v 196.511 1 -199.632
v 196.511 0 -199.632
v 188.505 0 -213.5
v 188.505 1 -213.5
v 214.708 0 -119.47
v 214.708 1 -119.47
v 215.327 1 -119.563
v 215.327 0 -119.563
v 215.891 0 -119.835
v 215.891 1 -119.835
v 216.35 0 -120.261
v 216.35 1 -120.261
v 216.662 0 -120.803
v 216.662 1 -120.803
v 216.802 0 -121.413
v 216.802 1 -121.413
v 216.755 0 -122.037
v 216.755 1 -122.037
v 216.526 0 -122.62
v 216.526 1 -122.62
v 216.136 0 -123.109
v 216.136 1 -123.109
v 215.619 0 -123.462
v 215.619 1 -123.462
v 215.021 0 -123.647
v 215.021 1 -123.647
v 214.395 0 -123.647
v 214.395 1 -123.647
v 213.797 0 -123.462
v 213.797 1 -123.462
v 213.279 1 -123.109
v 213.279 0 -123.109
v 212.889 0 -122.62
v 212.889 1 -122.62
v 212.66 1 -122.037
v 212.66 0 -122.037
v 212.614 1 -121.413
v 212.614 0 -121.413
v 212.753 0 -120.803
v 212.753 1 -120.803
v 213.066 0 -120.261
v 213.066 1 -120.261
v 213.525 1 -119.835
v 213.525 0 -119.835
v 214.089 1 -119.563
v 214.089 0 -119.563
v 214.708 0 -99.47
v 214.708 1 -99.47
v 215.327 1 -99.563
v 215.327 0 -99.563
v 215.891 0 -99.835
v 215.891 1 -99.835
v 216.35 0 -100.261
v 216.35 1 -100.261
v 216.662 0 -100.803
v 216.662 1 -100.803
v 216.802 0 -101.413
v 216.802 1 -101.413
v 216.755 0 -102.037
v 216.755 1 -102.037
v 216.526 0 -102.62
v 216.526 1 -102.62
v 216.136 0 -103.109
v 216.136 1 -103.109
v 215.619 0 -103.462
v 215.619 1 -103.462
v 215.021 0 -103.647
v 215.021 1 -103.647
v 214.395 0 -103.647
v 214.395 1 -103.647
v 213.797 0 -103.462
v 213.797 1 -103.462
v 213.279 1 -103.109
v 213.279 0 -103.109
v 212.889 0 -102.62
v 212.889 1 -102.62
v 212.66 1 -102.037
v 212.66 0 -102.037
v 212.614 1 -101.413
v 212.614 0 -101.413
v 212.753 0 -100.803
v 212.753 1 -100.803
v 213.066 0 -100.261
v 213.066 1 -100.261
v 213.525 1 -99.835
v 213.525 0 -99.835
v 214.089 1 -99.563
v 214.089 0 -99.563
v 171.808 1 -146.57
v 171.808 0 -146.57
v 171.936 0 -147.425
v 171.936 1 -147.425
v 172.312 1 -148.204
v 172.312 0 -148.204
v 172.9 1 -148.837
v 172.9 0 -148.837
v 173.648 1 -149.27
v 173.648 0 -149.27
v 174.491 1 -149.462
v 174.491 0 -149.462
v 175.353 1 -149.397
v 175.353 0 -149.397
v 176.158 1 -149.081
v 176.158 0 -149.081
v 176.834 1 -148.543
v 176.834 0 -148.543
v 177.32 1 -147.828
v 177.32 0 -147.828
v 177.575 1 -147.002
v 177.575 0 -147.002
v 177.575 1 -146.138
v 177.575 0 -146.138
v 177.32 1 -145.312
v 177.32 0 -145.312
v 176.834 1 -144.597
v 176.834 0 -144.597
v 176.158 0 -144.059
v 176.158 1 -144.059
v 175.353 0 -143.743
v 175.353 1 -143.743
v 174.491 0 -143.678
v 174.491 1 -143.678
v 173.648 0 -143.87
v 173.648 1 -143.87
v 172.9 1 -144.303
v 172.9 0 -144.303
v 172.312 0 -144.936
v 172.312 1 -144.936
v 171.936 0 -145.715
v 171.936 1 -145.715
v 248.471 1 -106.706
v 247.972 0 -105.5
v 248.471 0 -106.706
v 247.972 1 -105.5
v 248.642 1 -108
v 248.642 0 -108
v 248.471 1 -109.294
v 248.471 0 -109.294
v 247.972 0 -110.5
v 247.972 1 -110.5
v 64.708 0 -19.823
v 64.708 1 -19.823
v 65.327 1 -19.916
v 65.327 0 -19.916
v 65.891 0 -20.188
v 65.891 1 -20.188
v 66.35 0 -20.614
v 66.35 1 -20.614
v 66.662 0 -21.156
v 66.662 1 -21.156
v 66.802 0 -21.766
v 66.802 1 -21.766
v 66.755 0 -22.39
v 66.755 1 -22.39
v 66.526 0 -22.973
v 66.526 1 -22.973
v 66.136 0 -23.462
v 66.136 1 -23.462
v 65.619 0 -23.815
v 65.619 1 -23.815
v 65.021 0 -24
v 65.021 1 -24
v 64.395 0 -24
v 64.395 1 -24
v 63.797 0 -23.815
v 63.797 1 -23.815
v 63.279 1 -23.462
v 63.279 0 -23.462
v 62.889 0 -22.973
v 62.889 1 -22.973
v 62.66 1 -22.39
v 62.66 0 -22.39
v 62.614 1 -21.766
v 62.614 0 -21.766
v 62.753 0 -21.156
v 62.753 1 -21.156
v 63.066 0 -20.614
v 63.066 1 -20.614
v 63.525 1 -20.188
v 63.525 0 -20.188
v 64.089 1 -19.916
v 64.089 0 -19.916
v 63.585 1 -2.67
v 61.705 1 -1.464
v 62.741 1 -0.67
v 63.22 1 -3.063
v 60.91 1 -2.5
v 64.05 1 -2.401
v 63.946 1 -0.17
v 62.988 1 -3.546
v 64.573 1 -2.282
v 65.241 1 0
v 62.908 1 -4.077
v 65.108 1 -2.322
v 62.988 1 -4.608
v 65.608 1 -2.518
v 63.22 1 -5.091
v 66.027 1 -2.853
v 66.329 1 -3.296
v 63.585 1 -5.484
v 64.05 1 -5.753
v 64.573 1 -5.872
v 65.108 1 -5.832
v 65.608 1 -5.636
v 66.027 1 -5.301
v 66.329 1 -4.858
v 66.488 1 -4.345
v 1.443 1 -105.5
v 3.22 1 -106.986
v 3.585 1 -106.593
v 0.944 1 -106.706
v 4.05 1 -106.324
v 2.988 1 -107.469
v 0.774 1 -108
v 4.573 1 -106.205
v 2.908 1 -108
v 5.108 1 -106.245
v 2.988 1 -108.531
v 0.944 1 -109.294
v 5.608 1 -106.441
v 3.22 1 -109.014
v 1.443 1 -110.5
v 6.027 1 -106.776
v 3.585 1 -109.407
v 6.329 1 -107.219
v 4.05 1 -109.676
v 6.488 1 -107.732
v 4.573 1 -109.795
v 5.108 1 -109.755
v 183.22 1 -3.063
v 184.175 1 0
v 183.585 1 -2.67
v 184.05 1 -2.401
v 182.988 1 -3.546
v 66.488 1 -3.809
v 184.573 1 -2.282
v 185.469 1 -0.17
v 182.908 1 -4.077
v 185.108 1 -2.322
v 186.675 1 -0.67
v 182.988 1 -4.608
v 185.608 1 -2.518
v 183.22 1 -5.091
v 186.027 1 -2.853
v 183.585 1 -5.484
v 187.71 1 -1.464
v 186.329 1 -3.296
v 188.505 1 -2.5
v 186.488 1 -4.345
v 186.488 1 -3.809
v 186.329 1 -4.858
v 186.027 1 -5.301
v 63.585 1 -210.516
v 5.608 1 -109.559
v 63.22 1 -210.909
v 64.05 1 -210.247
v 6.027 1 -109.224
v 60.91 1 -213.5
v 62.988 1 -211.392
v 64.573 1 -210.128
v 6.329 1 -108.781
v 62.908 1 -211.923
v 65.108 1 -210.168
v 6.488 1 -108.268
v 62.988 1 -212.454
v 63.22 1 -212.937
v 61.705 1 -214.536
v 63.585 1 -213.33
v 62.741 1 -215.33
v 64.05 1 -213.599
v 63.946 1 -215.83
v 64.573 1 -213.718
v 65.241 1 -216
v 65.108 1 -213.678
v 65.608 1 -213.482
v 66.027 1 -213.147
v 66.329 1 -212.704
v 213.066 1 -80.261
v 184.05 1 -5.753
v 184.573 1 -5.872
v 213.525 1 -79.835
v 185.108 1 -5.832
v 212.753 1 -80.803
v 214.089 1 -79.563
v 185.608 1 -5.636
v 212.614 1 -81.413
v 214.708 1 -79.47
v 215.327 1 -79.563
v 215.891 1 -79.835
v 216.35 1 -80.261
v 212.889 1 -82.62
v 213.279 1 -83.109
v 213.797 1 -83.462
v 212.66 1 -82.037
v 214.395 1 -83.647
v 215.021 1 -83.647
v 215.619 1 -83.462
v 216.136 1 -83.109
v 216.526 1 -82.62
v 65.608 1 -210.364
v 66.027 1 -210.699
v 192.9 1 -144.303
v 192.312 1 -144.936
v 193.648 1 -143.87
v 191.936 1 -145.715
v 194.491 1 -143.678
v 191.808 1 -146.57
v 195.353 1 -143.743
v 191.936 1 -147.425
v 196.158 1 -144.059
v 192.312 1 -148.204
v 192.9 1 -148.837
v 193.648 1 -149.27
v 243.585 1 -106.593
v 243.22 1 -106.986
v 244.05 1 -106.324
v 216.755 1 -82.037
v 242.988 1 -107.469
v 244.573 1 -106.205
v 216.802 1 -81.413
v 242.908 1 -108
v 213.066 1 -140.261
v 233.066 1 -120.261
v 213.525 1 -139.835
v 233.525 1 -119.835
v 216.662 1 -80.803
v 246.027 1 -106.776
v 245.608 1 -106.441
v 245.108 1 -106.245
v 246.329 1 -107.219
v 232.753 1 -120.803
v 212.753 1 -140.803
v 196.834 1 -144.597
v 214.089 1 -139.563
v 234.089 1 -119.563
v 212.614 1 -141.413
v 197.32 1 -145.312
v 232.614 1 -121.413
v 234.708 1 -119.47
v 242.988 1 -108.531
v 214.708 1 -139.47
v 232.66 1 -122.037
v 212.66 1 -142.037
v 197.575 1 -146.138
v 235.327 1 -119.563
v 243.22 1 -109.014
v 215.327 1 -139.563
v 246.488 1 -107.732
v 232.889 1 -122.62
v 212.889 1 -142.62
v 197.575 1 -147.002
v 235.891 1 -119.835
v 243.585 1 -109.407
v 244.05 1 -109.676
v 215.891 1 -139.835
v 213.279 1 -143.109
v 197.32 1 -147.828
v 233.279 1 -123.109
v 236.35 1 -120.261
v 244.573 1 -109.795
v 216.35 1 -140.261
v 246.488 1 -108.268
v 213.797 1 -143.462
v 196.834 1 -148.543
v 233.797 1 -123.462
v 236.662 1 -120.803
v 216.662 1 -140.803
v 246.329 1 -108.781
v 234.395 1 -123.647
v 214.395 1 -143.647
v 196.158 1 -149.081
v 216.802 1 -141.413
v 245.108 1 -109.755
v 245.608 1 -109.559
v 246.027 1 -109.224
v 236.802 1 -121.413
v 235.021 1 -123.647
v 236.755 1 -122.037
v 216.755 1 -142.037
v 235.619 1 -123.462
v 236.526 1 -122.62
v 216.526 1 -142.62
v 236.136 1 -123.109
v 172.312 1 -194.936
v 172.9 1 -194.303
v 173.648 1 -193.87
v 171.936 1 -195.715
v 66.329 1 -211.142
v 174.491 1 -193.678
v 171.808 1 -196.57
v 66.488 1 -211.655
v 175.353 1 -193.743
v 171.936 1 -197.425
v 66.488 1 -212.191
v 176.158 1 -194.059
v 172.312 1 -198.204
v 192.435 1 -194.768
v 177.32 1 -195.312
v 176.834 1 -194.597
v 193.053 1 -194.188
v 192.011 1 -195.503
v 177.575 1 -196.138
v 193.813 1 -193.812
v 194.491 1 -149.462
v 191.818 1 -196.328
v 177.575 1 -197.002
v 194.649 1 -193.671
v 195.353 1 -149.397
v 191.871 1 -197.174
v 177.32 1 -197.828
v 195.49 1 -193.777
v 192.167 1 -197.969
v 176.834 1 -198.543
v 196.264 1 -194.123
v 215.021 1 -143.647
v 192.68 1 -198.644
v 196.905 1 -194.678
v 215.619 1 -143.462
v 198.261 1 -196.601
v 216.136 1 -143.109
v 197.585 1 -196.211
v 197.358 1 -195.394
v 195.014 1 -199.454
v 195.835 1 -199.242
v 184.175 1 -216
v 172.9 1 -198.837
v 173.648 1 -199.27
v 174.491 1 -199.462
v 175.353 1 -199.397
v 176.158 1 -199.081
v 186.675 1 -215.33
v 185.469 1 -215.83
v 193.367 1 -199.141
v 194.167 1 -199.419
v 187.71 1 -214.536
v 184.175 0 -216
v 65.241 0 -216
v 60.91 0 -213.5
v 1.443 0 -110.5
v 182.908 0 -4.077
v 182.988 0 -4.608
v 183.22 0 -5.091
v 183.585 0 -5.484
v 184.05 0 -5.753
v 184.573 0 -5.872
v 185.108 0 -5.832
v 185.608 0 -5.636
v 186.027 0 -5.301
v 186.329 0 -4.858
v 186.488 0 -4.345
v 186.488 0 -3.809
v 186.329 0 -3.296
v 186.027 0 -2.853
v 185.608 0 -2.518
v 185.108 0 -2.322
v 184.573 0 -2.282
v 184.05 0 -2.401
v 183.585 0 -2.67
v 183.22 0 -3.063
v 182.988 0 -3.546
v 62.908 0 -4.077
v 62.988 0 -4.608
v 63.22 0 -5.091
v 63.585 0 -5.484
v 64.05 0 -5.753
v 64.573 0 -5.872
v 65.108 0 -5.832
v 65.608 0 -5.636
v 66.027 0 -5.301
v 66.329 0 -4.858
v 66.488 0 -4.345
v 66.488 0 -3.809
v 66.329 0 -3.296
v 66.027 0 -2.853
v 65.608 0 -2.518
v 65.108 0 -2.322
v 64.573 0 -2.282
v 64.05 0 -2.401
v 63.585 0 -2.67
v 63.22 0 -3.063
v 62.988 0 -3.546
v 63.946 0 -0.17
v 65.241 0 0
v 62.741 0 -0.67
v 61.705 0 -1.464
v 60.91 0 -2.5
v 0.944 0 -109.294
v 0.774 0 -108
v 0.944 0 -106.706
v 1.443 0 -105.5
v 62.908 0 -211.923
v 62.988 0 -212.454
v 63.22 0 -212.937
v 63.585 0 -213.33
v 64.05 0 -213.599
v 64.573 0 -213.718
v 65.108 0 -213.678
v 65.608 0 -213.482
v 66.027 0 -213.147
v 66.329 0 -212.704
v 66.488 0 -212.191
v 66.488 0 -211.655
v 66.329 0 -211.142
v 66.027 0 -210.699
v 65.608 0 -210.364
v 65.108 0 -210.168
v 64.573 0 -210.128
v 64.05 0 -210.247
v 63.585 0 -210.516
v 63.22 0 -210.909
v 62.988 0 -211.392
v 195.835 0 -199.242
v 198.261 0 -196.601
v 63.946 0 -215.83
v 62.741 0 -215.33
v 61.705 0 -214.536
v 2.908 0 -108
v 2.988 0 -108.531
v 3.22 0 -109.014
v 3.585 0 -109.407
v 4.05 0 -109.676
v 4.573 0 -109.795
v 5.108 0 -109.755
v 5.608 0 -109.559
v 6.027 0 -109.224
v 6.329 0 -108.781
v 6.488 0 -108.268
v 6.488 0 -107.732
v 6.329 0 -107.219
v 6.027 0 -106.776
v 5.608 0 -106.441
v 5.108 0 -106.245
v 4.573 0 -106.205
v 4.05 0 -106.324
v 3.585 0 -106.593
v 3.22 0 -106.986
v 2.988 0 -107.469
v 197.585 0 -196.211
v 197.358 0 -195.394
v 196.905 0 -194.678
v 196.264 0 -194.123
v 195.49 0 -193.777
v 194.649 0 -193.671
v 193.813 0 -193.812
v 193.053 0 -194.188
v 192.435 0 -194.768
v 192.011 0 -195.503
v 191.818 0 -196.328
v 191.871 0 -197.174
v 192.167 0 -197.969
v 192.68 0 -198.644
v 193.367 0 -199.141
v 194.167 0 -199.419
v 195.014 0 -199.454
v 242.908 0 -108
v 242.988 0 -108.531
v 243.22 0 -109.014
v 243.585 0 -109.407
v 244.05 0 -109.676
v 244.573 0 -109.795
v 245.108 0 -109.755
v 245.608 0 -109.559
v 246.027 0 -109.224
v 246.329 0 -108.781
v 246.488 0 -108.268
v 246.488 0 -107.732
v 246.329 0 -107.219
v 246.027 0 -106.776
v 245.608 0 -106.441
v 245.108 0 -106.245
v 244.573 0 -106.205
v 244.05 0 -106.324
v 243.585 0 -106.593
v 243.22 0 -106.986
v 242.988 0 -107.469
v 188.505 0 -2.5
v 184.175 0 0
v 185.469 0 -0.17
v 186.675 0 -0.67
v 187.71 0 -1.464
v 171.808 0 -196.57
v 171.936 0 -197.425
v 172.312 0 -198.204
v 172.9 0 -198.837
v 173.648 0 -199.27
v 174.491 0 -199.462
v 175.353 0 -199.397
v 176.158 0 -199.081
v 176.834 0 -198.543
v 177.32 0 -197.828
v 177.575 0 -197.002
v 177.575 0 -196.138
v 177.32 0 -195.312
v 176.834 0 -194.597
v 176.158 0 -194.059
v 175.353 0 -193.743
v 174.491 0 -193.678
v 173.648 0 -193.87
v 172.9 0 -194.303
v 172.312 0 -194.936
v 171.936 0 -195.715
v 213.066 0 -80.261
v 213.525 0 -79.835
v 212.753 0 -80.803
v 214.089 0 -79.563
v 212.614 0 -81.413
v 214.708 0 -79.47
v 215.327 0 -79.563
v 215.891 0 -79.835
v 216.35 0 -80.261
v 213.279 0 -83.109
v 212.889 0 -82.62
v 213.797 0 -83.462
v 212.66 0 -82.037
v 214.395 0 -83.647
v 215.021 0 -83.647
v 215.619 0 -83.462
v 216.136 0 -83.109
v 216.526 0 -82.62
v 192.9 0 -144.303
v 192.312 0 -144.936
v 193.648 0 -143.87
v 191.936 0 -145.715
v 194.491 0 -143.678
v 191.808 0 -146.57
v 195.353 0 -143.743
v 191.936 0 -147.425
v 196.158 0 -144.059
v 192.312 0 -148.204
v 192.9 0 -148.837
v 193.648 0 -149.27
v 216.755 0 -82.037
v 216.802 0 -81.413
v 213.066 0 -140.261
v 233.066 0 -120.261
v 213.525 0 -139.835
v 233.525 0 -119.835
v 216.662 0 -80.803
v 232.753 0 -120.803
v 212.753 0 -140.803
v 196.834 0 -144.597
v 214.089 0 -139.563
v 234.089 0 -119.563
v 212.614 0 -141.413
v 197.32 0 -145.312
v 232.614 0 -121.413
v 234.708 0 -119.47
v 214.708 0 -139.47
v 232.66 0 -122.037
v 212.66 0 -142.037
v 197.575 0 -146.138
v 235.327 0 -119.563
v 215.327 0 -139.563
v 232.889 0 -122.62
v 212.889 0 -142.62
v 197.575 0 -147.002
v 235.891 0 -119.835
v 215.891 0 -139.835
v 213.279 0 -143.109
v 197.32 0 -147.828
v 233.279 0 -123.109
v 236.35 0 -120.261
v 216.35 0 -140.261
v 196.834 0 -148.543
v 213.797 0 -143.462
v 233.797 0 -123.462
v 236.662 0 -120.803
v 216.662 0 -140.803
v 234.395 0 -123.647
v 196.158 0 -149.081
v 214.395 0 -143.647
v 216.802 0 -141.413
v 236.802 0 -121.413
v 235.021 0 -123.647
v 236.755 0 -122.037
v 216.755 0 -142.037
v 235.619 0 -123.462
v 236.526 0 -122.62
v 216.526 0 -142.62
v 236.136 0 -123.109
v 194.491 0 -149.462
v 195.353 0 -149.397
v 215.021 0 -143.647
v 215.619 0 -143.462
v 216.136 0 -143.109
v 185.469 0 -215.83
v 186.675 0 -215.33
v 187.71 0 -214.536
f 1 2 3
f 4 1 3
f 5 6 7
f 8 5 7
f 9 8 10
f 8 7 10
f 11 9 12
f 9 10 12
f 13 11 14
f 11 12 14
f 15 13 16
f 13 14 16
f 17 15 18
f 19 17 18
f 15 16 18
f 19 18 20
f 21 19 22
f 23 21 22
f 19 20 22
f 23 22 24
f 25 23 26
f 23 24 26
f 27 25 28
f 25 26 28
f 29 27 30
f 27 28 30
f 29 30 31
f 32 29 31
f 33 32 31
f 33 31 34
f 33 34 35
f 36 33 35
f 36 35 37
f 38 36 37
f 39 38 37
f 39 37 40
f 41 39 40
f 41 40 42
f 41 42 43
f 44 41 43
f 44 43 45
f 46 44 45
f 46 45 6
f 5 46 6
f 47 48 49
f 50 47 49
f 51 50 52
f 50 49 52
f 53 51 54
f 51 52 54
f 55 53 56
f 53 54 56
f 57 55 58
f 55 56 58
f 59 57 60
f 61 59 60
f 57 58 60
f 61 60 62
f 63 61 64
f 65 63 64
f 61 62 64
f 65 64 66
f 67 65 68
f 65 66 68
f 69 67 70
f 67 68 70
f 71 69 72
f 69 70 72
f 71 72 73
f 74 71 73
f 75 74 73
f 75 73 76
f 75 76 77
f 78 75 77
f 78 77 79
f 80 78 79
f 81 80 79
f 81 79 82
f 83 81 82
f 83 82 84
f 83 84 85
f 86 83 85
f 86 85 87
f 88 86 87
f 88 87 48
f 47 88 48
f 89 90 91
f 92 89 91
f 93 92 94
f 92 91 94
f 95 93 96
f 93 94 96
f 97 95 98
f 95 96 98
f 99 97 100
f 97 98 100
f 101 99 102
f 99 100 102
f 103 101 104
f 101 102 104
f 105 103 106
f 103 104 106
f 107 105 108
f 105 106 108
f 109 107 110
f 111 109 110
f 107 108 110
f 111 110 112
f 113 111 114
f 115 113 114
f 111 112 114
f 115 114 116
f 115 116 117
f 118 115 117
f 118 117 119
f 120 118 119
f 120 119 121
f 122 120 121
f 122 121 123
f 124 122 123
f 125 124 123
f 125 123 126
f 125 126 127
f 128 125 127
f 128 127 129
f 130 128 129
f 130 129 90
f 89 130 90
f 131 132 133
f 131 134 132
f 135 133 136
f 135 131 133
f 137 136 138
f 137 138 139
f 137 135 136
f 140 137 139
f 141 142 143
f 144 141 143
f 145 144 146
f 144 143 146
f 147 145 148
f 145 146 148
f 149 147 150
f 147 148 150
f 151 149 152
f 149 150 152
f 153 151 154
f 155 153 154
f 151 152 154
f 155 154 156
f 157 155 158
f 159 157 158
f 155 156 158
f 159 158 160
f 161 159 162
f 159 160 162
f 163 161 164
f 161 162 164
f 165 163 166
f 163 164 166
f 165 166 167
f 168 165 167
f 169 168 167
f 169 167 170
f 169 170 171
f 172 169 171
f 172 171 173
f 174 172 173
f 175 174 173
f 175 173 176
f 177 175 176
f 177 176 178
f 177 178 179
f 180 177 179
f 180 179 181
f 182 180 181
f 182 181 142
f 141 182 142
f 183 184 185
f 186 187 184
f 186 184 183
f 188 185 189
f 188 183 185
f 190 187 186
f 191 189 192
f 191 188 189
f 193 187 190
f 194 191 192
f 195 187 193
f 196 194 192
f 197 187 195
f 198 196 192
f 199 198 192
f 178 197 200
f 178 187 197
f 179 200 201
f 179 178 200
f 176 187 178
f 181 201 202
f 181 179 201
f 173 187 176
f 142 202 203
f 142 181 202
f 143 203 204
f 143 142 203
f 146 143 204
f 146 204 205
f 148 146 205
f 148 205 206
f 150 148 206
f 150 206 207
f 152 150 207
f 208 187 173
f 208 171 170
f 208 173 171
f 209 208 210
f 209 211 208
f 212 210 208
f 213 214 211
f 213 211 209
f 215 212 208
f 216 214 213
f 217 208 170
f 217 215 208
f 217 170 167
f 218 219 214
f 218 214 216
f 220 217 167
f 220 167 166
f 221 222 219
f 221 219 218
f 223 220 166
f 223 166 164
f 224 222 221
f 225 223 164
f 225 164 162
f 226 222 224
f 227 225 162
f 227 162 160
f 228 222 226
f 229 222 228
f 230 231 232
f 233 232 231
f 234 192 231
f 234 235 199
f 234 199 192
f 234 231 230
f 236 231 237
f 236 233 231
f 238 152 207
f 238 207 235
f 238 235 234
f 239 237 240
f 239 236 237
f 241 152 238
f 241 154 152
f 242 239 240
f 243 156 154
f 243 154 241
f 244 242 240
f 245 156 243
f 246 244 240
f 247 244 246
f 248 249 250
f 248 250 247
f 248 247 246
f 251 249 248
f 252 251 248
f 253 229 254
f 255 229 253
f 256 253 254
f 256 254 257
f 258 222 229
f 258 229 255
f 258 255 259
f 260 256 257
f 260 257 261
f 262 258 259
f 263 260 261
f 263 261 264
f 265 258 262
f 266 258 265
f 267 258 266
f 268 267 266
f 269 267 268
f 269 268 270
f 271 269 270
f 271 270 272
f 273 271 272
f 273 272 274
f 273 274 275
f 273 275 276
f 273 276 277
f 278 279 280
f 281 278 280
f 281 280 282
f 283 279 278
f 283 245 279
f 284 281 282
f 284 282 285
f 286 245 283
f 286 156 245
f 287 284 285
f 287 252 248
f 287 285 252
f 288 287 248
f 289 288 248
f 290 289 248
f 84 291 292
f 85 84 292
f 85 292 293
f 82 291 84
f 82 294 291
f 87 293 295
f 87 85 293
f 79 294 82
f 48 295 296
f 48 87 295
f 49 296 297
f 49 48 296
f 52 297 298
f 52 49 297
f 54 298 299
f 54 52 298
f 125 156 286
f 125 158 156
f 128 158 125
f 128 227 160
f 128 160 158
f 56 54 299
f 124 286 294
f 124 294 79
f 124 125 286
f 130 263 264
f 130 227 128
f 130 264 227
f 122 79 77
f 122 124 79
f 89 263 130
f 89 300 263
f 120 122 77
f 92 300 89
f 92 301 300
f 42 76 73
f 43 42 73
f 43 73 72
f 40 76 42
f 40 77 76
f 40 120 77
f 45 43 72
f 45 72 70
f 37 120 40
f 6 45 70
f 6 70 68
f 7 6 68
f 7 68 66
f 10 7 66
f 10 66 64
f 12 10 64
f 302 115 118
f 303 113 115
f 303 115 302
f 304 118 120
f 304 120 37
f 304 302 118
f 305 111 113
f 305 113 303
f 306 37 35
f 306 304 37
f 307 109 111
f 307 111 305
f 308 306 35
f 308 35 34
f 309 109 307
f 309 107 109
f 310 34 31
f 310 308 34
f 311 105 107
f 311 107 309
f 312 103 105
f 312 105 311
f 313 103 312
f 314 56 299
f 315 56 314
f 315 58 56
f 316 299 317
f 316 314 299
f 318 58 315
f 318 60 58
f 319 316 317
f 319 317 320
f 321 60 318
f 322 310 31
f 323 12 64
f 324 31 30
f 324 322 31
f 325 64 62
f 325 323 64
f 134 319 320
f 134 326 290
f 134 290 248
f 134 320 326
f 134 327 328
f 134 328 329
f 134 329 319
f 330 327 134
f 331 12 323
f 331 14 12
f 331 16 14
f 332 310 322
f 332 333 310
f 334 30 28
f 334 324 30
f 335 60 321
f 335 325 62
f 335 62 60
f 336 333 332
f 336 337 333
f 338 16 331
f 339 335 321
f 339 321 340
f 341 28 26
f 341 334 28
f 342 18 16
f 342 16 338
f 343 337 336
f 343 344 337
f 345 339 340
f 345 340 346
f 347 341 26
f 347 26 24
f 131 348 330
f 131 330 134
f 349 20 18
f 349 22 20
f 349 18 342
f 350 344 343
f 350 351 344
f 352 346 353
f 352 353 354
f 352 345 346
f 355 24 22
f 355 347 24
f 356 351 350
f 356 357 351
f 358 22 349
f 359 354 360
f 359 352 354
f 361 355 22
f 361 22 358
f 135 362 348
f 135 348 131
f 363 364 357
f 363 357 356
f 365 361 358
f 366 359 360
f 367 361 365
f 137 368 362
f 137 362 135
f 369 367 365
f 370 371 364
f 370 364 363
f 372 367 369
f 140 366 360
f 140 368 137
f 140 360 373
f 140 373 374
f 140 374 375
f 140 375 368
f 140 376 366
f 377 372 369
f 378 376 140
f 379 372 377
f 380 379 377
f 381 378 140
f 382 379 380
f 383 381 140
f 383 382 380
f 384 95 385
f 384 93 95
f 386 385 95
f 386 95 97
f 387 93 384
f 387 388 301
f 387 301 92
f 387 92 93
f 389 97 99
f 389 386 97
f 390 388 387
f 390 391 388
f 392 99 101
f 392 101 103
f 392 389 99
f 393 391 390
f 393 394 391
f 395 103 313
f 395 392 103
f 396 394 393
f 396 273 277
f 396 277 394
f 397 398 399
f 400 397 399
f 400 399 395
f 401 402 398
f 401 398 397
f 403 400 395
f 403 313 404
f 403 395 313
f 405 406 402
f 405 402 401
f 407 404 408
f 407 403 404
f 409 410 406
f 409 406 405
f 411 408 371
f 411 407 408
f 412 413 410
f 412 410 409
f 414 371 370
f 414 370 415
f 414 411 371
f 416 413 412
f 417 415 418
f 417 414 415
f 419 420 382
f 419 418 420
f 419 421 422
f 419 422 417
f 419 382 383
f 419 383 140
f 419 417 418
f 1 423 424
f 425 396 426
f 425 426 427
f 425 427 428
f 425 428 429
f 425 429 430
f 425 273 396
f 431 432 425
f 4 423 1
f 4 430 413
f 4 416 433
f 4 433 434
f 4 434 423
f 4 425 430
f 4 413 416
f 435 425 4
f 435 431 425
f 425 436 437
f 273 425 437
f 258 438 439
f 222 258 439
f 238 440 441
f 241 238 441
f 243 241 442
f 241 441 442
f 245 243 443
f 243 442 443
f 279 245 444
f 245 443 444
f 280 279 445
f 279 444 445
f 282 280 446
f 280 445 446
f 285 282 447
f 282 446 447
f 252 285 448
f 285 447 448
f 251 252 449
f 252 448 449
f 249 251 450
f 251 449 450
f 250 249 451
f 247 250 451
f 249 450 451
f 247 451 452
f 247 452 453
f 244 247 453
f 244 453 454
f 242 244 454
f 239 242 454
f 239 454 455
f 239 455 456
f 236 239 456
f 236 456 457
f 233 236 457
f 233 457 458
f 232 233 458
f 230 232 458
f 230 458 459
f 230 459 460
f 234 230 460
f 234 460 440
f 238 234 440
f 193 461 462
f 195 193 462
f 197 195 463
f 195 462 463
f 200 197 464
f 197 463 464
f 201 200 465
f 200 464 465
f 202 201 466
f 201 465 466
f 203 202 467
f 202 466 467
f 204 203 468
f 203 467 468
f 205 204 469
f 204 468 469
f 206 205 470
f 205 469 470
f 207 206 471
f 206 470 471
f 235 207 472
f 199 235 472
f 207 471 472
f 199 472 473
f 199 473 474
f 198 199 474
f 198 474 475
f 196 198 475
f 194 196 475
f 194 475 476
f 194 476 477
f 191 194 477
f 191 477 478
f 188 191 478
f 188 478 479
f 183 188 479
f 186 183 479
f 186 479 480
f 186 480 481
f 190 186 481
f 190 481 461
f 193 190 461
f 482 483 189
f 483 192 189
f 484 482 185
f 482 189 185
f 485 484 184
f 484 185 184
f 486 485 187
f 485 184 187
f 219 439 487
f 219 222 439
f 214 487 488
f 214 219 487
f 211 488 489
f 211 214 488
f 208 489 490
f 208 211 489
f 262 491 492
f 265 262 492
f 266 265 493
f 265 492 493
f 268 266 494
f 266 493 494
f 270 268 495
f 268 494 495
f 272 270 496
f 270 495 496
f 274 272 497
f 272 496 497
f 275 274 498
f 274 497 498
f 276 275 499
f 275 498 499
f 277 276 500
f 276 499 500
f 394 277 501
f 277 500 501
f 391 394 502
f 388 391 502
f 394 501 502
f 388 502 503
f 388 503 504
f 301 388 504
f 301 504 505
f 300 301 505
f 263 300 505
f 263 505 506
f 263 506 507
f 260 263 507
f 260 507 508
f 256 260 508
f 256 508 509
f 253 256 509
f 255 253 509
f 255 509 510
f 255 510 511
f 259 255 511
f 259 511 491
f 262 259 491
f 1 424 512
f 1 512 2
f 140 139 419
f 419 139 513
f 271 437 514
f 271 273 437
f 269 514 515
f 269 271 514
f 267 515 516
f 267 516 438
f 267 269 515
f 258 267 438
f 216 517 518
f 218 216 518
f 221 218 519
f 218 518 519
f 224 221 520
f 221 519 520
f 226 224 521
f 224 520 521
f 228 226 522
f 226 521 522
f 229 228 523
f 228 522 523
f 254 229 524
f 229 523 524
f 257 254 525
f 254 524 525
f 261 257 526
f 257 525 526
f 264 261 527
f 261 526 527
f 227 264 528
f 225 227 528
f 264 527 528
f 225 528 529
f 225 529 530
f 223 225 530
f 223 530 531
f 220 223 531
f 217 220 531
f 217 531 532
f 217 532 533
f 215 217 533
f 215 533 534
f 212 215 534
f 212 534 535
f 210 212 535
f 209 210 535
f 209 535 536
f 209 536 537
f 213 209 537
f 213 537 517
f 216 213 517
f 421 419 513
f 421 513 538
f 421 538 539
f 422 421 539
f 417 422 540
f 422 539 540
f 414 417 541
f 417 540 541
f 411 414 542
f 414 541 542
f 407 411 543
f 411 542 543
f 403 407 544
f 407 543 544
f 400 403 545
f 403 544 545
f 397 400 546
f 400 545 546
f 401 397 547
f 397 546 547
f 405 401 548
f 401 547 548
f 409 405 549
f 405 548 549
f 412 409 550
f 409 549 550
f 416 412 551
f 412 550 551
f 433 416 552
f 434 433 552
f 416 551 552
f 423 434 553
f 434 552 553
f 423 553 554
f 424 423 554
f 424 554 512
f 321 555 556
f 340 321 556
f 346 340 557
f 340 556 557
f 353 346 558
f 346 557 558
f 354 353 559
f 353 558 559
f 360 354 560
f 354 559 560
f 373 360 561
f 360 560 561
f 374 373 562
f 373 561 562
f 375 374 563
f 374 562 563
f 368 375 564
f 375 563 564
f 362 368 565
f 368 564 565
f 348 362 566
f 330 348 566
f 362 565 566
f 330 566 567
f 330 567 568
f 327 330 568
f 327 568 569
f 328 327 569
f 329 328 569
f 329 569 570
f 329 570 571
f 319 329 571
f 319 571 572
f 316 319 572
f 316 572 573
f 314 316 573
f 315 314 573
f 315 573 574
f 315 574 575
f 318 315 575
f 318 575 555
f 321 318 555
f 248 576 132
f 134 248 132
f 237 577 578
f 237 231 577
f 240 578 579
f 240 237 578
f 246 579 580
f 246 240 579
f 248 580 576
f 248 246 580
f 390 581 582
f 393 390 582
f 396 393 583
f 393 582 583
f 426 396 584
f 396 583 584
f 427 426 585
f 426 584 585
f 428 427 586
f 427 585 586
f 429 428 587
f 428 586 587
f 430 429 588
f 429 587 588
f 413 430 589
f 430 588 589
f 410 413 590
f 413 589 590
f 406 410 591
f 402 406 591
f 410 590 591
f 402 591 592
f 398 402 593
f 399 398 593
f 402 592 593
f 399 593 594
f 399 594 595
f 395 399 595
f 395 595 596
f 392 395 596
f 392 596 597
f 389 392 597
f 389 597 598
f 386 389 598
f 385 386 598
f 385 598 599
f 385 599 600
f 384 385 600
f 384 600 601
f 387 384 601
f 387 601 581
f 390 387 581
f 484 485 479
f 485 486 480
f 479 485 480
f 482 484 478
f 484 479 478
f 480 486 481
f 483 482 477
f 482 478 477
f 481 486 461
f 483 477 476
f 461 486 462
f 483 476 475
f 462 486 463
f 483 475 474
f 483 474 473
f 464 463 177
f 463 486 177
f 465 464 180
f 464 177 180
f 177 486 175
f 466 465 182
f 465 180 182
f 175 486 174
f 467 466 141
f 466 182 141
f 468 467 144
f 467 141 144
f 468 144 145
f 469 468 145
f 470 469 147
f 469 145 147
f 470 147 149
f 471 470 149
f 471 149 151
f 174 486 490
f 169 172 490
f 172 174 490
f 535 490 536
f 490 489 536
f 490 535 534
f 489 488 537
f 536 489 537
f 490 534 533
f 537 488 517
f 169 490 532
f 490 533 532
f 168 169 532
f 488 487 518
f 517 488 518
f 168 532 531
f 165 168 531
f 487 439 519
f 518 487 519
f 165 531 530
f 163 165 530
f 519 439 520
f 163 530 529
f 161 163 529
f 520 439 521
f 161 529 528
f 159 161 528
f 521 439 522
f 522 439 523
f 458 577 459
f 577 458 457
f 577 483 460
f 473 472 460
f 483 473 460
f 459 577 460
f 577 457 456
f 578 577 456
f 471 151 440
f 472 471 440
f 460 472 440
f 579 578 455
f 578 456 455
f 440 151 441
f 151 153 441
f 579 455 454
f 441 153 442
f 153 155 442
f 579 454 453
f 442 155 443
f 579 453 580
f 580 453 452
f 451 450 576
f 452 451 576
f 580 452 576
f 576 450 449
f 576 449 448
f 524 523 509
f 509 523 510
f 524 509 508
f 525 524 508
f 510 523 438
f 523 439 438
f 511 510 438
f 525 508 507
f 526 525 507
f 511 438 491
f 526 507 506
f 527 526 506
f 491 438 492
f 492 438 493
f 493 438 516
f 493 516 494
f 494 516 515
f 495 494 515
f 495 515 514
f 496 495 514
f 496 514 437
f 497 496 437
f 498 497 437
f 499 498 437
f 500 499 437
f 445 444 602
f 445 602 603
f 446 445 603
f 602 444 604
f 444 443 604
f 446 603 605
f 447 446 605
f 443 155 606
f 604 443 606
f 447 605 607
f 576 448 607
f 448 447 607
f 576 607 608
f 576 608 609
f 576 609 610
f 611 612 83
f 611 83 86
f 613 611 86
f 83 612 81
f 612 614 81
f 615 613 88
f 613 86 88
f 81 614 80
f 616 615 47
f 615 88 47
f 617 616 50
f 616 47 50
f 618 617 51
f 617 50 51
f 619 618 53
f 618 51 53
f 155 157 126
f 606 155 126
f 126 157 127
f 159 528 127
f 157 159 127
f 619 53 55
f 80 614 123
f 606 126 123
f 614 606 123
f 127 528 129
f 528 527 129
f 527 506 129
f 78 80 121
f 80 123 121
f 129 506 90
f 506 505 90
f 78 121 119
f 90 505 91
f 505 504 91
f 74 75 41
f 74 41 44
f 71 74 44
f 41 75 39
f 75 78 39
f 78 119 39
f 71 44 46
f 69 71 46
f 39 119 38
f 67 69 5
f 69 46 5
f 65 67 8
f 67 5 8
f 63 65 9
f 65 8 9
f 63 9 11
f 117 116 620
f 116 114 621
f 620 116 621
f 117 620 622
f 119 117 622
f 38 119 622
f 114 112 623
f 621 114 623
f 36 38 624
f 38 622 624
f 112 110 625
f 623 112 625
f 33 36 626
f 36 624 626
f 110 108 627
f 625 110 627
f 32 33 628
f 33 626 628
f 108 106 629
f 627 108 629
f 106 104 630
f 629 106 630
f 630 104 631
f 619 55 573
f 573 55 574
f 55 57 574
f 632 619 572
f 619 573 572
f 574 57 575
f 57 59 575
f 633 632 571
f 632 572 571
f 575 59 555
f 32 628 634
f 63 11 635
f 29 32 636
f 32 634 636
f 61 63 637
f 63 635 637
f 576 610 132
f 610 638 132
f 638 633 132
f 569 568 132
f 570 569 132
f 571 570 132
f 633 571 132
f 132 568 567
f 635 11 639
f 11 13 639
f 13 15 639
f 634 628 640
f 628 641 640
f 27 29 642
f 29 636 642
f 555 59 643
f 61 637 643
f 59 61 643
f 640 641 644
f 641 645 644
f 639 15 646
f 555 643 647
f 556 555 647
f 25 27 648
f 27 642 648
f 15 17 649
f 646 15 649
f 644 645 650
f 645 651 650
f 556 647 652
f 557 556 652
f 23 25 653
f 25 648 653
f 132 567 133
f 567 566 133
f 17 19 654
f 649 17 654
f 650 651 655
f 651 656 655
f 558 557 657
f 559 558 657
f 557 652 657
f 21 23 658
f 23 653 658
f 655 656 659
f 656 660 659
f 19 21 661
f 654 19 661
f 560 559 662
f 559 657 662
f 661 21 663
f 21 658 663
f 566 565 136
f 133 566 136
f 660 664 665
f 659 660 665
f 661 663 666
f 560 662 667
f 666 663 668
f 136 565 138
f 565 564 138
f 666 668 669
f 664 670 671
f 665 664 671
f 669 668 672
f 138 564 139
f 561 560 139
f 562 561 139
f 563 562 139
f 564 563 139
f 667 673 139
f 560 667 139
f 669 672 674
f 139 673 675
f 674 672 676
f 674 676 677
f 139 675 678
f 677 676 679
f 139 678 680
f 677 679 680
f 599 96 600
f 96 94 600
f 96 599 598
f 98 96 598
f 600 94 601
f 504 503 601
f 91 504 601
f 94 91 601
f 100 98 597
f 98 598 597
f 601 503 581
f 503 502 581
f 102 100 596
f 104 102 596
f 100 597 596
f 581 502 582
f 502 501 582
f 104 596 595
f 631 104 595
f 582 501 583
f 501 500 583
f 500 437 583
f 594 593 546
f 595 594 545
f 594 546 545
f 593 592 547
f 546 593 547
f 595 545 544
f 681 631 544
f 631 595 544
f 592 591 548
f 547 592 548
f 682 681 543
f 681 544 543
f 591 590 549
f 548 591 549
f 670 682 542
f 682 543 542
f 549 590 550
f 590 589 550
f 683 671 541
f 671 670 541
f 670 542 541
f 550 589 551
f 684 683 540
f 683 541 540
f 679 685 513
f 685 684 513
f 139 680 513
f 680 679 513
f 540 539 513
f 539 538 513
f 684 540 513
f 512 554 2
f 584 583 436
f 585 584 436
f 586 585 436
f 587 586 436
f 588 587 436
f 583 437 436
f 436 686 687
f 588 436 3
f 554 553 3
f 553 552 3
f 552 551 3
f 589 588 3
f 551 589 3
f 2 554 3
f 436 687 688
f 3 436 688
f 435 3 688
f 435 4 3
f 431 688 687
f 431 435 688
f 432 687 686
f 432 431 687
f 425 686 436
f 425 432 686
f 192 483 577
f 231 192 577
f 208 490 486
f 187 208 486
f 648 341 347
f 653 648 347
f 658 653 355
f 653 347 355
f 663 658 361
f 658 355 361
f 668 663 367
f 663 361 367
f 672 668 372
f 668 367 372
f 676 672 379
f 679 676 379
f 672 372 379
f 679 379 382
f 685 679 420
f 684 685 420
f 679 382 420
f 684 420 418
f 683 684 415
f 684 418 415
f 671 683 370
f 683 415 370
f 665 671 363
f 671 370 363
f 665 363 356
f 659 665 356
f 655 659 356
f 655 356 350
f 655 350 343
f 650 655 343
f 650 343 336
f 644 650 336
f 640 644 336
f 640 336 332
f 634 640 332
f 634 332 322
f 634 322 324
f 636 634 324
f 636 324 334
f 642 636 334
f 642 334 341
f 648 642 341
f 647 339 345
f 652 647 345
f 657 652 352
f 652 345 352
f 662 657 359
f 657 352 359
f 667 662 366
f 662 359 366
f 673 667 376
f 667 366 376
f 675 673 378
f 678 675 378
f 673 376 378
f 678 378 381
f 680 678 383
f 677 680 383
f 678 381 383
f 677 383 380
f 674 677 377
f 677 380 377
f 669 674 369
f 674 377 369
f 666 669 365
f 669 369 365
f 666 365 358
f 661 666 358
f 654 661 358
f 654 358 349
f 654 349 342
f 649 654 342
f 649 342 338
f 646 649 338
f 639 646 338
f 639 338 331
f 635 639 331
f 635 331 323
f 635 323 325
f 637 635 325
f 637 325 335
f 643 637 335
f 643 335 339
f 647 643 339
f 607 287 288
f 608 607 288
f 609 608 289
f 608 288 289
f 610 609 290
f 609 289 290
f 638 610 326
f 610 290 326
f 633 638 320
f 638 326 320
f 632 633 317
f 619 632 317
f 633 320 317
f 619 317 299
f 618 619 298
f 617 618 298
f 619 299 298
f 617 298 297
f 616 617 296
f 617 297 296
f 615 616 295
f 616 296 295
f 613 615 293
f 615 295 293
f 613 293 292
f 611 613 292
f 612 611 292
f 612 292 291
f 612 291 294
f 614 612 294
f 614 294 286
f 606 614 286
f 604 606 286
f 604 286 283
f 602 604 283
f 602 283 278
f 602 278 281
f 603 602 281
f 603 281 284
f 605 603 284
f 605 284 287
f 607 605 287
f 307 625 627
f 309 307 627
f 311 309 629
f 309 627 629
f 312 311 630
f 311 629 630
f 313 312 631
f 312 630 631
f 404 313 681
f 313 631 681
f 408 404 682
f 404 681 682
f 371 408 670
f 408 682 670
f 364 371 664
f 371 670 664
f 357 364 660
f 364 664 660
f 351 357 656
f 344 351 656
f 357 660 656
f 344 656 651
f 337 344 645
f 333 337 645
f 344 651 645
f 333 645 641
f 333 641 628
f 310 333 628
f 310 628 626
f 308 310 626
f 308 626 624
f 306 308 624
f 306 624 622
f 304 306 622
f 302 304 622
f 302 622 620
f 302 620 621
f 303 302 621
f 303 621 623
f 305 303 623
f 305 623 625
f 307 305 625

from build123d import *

# Parameters (mm, degrees)
BOSS_EXTRUDE1_DEPTH      = 1
FILLET1_R                = 5
M5_CLEARANCE_HOLE1_D     = 5.8
M5_CLEARANCE_HOLE1_DEPTH = 5
M5_CLEARANCE_HOLE1_TIP   = 1.742495795
M3_CLEARANCE_HOLE1_D     = 3.6
CUT_EXTRUDE1_DEPTH       = 330.362644314
SKETCH10_R               = 2.1
CUT_EXTRUDE2_DEPTH       = 330.362644314


with BuildPart() as part:
    # Sketch1 → Boss-Extrude1 (new body)
    with BuildSketch(Plane(origin=(0, 0, 0), x_dir=(1, 0, 0), z_dir=(0, 1, 0))):
        Polygon((62.353829072, 0), (187.061487217, 0), (249.41531629, 108), (187.061487217, 216), (62.353829072, 216), (0, 108), align=None)
    extrude(amount=BOSS_EXTRUDE1_DEPTH)

    # Fillet1
    fillet1_edges = [part.edges().sort_by_distance(p)[0] for p in [
        (0, 0.5, -108),
        (62.353829072, 0.5, -216),
        (187.061487217, 0.5, -216),
        (249.41531629, 0.5, -108),
        (187.061487217, 0.5, 0),
        (62.353829072, 0.5, 0),
    ]]
    fillet(fillet1_edges, radius=FILLET1_R)

    # M5 Clearance Hole1
    with Locations(Plane(origin=(0, 1, 0), x_dir=(1, 0, 0), z_dir=(0, 1, 0))):
        with Locations((174.707658145, 146.57), (194.707658145, 146.57), (194.707658145, 196.57), (174.707658145, 196.57)):
            Hole(M5_CLEARANCE_HOLE1_D / 2, depth=M5_CLEARANCE_HOLE1_DEPTH)
            with Locations((0, 0, -(M5_CLEARANCE_HOLE1_DEPTH + M5_CLEARANCE_HOLE1_TIP / 2))):  # 118° drill point
                Cone(0, M5_CLEARANCE_HOLE1_D / 2, M5_CLEARANCE_HOLE1_TIP, mode=Mode.SUBTRACT)

    # M3 Clearance Hole1 (through all)
    with Locations(Plane(origin=(0, 1, 0), x_dir=(1, 0, 0), z_dir=(0, 1, 0))):
        with Locations((4.707658145, 108), (64.707658145, 211.923048454), (244.707658145, 108), (184.707658145, 4.076951546), (64.707658145, 4.076951546)):
            Hole(M3_CLEARANCE_HOLE1_D / 2)

    # Sketch9 → Cut-Extrude1 (cut, through all)
    with BuildSketch(Plane(origin=(0, 1, 0), x_dir=(1, 0, 0), z_dir=(0, 1, 0))):
        Polygon((195.835312633, 199.241777565), (196.511466747, 199.632155324), (198.261466747, 196.601066411), (197.585312633, 196.210688651), align=None)
    extrude(amount=-CUT_EXTRUDE1_DEPTH, mode=Mode.SUBTRACT)

    # Sketch10 → Cut-Extrude2 (cut, through all)
    with BuildSketch(Plane(origin=(0, 1, 0), x_dir=(1, 0, 0), z_dir=(0, 1, 0))):
        with Locations(Location((64.707658145, 21.923048454, 0), (0, 0, 270))):
            Circle(SKETCH10_R)
        with Locations(Location((214.707658145, 141.57, 0), (0, 0, 270))):
            Circle(SKETCH10_R)
        with Locations(Location((214.707658145, 121.57, 0), (0, 0, 270))):
            Circle(SKETCH10_R)
        with Locations(Location((214.707658145, 101.57, 0), (0, 0, 270))):
            Circle(SKETCH10_R)
        with Locations(Location((214.707658145, 81.57, 0), (0, 0, 270))):
            Circle(SKETCH10_R)
        with Locations(Location((234.707658145, 121.57, 0), (0, 0, 270))):
            Circle(SKETCH10_R)
    extrude(amount=-CUT_EXTRUDE2_DEPTH, mode=Mode.SUBTRACT)


solid = part.part
